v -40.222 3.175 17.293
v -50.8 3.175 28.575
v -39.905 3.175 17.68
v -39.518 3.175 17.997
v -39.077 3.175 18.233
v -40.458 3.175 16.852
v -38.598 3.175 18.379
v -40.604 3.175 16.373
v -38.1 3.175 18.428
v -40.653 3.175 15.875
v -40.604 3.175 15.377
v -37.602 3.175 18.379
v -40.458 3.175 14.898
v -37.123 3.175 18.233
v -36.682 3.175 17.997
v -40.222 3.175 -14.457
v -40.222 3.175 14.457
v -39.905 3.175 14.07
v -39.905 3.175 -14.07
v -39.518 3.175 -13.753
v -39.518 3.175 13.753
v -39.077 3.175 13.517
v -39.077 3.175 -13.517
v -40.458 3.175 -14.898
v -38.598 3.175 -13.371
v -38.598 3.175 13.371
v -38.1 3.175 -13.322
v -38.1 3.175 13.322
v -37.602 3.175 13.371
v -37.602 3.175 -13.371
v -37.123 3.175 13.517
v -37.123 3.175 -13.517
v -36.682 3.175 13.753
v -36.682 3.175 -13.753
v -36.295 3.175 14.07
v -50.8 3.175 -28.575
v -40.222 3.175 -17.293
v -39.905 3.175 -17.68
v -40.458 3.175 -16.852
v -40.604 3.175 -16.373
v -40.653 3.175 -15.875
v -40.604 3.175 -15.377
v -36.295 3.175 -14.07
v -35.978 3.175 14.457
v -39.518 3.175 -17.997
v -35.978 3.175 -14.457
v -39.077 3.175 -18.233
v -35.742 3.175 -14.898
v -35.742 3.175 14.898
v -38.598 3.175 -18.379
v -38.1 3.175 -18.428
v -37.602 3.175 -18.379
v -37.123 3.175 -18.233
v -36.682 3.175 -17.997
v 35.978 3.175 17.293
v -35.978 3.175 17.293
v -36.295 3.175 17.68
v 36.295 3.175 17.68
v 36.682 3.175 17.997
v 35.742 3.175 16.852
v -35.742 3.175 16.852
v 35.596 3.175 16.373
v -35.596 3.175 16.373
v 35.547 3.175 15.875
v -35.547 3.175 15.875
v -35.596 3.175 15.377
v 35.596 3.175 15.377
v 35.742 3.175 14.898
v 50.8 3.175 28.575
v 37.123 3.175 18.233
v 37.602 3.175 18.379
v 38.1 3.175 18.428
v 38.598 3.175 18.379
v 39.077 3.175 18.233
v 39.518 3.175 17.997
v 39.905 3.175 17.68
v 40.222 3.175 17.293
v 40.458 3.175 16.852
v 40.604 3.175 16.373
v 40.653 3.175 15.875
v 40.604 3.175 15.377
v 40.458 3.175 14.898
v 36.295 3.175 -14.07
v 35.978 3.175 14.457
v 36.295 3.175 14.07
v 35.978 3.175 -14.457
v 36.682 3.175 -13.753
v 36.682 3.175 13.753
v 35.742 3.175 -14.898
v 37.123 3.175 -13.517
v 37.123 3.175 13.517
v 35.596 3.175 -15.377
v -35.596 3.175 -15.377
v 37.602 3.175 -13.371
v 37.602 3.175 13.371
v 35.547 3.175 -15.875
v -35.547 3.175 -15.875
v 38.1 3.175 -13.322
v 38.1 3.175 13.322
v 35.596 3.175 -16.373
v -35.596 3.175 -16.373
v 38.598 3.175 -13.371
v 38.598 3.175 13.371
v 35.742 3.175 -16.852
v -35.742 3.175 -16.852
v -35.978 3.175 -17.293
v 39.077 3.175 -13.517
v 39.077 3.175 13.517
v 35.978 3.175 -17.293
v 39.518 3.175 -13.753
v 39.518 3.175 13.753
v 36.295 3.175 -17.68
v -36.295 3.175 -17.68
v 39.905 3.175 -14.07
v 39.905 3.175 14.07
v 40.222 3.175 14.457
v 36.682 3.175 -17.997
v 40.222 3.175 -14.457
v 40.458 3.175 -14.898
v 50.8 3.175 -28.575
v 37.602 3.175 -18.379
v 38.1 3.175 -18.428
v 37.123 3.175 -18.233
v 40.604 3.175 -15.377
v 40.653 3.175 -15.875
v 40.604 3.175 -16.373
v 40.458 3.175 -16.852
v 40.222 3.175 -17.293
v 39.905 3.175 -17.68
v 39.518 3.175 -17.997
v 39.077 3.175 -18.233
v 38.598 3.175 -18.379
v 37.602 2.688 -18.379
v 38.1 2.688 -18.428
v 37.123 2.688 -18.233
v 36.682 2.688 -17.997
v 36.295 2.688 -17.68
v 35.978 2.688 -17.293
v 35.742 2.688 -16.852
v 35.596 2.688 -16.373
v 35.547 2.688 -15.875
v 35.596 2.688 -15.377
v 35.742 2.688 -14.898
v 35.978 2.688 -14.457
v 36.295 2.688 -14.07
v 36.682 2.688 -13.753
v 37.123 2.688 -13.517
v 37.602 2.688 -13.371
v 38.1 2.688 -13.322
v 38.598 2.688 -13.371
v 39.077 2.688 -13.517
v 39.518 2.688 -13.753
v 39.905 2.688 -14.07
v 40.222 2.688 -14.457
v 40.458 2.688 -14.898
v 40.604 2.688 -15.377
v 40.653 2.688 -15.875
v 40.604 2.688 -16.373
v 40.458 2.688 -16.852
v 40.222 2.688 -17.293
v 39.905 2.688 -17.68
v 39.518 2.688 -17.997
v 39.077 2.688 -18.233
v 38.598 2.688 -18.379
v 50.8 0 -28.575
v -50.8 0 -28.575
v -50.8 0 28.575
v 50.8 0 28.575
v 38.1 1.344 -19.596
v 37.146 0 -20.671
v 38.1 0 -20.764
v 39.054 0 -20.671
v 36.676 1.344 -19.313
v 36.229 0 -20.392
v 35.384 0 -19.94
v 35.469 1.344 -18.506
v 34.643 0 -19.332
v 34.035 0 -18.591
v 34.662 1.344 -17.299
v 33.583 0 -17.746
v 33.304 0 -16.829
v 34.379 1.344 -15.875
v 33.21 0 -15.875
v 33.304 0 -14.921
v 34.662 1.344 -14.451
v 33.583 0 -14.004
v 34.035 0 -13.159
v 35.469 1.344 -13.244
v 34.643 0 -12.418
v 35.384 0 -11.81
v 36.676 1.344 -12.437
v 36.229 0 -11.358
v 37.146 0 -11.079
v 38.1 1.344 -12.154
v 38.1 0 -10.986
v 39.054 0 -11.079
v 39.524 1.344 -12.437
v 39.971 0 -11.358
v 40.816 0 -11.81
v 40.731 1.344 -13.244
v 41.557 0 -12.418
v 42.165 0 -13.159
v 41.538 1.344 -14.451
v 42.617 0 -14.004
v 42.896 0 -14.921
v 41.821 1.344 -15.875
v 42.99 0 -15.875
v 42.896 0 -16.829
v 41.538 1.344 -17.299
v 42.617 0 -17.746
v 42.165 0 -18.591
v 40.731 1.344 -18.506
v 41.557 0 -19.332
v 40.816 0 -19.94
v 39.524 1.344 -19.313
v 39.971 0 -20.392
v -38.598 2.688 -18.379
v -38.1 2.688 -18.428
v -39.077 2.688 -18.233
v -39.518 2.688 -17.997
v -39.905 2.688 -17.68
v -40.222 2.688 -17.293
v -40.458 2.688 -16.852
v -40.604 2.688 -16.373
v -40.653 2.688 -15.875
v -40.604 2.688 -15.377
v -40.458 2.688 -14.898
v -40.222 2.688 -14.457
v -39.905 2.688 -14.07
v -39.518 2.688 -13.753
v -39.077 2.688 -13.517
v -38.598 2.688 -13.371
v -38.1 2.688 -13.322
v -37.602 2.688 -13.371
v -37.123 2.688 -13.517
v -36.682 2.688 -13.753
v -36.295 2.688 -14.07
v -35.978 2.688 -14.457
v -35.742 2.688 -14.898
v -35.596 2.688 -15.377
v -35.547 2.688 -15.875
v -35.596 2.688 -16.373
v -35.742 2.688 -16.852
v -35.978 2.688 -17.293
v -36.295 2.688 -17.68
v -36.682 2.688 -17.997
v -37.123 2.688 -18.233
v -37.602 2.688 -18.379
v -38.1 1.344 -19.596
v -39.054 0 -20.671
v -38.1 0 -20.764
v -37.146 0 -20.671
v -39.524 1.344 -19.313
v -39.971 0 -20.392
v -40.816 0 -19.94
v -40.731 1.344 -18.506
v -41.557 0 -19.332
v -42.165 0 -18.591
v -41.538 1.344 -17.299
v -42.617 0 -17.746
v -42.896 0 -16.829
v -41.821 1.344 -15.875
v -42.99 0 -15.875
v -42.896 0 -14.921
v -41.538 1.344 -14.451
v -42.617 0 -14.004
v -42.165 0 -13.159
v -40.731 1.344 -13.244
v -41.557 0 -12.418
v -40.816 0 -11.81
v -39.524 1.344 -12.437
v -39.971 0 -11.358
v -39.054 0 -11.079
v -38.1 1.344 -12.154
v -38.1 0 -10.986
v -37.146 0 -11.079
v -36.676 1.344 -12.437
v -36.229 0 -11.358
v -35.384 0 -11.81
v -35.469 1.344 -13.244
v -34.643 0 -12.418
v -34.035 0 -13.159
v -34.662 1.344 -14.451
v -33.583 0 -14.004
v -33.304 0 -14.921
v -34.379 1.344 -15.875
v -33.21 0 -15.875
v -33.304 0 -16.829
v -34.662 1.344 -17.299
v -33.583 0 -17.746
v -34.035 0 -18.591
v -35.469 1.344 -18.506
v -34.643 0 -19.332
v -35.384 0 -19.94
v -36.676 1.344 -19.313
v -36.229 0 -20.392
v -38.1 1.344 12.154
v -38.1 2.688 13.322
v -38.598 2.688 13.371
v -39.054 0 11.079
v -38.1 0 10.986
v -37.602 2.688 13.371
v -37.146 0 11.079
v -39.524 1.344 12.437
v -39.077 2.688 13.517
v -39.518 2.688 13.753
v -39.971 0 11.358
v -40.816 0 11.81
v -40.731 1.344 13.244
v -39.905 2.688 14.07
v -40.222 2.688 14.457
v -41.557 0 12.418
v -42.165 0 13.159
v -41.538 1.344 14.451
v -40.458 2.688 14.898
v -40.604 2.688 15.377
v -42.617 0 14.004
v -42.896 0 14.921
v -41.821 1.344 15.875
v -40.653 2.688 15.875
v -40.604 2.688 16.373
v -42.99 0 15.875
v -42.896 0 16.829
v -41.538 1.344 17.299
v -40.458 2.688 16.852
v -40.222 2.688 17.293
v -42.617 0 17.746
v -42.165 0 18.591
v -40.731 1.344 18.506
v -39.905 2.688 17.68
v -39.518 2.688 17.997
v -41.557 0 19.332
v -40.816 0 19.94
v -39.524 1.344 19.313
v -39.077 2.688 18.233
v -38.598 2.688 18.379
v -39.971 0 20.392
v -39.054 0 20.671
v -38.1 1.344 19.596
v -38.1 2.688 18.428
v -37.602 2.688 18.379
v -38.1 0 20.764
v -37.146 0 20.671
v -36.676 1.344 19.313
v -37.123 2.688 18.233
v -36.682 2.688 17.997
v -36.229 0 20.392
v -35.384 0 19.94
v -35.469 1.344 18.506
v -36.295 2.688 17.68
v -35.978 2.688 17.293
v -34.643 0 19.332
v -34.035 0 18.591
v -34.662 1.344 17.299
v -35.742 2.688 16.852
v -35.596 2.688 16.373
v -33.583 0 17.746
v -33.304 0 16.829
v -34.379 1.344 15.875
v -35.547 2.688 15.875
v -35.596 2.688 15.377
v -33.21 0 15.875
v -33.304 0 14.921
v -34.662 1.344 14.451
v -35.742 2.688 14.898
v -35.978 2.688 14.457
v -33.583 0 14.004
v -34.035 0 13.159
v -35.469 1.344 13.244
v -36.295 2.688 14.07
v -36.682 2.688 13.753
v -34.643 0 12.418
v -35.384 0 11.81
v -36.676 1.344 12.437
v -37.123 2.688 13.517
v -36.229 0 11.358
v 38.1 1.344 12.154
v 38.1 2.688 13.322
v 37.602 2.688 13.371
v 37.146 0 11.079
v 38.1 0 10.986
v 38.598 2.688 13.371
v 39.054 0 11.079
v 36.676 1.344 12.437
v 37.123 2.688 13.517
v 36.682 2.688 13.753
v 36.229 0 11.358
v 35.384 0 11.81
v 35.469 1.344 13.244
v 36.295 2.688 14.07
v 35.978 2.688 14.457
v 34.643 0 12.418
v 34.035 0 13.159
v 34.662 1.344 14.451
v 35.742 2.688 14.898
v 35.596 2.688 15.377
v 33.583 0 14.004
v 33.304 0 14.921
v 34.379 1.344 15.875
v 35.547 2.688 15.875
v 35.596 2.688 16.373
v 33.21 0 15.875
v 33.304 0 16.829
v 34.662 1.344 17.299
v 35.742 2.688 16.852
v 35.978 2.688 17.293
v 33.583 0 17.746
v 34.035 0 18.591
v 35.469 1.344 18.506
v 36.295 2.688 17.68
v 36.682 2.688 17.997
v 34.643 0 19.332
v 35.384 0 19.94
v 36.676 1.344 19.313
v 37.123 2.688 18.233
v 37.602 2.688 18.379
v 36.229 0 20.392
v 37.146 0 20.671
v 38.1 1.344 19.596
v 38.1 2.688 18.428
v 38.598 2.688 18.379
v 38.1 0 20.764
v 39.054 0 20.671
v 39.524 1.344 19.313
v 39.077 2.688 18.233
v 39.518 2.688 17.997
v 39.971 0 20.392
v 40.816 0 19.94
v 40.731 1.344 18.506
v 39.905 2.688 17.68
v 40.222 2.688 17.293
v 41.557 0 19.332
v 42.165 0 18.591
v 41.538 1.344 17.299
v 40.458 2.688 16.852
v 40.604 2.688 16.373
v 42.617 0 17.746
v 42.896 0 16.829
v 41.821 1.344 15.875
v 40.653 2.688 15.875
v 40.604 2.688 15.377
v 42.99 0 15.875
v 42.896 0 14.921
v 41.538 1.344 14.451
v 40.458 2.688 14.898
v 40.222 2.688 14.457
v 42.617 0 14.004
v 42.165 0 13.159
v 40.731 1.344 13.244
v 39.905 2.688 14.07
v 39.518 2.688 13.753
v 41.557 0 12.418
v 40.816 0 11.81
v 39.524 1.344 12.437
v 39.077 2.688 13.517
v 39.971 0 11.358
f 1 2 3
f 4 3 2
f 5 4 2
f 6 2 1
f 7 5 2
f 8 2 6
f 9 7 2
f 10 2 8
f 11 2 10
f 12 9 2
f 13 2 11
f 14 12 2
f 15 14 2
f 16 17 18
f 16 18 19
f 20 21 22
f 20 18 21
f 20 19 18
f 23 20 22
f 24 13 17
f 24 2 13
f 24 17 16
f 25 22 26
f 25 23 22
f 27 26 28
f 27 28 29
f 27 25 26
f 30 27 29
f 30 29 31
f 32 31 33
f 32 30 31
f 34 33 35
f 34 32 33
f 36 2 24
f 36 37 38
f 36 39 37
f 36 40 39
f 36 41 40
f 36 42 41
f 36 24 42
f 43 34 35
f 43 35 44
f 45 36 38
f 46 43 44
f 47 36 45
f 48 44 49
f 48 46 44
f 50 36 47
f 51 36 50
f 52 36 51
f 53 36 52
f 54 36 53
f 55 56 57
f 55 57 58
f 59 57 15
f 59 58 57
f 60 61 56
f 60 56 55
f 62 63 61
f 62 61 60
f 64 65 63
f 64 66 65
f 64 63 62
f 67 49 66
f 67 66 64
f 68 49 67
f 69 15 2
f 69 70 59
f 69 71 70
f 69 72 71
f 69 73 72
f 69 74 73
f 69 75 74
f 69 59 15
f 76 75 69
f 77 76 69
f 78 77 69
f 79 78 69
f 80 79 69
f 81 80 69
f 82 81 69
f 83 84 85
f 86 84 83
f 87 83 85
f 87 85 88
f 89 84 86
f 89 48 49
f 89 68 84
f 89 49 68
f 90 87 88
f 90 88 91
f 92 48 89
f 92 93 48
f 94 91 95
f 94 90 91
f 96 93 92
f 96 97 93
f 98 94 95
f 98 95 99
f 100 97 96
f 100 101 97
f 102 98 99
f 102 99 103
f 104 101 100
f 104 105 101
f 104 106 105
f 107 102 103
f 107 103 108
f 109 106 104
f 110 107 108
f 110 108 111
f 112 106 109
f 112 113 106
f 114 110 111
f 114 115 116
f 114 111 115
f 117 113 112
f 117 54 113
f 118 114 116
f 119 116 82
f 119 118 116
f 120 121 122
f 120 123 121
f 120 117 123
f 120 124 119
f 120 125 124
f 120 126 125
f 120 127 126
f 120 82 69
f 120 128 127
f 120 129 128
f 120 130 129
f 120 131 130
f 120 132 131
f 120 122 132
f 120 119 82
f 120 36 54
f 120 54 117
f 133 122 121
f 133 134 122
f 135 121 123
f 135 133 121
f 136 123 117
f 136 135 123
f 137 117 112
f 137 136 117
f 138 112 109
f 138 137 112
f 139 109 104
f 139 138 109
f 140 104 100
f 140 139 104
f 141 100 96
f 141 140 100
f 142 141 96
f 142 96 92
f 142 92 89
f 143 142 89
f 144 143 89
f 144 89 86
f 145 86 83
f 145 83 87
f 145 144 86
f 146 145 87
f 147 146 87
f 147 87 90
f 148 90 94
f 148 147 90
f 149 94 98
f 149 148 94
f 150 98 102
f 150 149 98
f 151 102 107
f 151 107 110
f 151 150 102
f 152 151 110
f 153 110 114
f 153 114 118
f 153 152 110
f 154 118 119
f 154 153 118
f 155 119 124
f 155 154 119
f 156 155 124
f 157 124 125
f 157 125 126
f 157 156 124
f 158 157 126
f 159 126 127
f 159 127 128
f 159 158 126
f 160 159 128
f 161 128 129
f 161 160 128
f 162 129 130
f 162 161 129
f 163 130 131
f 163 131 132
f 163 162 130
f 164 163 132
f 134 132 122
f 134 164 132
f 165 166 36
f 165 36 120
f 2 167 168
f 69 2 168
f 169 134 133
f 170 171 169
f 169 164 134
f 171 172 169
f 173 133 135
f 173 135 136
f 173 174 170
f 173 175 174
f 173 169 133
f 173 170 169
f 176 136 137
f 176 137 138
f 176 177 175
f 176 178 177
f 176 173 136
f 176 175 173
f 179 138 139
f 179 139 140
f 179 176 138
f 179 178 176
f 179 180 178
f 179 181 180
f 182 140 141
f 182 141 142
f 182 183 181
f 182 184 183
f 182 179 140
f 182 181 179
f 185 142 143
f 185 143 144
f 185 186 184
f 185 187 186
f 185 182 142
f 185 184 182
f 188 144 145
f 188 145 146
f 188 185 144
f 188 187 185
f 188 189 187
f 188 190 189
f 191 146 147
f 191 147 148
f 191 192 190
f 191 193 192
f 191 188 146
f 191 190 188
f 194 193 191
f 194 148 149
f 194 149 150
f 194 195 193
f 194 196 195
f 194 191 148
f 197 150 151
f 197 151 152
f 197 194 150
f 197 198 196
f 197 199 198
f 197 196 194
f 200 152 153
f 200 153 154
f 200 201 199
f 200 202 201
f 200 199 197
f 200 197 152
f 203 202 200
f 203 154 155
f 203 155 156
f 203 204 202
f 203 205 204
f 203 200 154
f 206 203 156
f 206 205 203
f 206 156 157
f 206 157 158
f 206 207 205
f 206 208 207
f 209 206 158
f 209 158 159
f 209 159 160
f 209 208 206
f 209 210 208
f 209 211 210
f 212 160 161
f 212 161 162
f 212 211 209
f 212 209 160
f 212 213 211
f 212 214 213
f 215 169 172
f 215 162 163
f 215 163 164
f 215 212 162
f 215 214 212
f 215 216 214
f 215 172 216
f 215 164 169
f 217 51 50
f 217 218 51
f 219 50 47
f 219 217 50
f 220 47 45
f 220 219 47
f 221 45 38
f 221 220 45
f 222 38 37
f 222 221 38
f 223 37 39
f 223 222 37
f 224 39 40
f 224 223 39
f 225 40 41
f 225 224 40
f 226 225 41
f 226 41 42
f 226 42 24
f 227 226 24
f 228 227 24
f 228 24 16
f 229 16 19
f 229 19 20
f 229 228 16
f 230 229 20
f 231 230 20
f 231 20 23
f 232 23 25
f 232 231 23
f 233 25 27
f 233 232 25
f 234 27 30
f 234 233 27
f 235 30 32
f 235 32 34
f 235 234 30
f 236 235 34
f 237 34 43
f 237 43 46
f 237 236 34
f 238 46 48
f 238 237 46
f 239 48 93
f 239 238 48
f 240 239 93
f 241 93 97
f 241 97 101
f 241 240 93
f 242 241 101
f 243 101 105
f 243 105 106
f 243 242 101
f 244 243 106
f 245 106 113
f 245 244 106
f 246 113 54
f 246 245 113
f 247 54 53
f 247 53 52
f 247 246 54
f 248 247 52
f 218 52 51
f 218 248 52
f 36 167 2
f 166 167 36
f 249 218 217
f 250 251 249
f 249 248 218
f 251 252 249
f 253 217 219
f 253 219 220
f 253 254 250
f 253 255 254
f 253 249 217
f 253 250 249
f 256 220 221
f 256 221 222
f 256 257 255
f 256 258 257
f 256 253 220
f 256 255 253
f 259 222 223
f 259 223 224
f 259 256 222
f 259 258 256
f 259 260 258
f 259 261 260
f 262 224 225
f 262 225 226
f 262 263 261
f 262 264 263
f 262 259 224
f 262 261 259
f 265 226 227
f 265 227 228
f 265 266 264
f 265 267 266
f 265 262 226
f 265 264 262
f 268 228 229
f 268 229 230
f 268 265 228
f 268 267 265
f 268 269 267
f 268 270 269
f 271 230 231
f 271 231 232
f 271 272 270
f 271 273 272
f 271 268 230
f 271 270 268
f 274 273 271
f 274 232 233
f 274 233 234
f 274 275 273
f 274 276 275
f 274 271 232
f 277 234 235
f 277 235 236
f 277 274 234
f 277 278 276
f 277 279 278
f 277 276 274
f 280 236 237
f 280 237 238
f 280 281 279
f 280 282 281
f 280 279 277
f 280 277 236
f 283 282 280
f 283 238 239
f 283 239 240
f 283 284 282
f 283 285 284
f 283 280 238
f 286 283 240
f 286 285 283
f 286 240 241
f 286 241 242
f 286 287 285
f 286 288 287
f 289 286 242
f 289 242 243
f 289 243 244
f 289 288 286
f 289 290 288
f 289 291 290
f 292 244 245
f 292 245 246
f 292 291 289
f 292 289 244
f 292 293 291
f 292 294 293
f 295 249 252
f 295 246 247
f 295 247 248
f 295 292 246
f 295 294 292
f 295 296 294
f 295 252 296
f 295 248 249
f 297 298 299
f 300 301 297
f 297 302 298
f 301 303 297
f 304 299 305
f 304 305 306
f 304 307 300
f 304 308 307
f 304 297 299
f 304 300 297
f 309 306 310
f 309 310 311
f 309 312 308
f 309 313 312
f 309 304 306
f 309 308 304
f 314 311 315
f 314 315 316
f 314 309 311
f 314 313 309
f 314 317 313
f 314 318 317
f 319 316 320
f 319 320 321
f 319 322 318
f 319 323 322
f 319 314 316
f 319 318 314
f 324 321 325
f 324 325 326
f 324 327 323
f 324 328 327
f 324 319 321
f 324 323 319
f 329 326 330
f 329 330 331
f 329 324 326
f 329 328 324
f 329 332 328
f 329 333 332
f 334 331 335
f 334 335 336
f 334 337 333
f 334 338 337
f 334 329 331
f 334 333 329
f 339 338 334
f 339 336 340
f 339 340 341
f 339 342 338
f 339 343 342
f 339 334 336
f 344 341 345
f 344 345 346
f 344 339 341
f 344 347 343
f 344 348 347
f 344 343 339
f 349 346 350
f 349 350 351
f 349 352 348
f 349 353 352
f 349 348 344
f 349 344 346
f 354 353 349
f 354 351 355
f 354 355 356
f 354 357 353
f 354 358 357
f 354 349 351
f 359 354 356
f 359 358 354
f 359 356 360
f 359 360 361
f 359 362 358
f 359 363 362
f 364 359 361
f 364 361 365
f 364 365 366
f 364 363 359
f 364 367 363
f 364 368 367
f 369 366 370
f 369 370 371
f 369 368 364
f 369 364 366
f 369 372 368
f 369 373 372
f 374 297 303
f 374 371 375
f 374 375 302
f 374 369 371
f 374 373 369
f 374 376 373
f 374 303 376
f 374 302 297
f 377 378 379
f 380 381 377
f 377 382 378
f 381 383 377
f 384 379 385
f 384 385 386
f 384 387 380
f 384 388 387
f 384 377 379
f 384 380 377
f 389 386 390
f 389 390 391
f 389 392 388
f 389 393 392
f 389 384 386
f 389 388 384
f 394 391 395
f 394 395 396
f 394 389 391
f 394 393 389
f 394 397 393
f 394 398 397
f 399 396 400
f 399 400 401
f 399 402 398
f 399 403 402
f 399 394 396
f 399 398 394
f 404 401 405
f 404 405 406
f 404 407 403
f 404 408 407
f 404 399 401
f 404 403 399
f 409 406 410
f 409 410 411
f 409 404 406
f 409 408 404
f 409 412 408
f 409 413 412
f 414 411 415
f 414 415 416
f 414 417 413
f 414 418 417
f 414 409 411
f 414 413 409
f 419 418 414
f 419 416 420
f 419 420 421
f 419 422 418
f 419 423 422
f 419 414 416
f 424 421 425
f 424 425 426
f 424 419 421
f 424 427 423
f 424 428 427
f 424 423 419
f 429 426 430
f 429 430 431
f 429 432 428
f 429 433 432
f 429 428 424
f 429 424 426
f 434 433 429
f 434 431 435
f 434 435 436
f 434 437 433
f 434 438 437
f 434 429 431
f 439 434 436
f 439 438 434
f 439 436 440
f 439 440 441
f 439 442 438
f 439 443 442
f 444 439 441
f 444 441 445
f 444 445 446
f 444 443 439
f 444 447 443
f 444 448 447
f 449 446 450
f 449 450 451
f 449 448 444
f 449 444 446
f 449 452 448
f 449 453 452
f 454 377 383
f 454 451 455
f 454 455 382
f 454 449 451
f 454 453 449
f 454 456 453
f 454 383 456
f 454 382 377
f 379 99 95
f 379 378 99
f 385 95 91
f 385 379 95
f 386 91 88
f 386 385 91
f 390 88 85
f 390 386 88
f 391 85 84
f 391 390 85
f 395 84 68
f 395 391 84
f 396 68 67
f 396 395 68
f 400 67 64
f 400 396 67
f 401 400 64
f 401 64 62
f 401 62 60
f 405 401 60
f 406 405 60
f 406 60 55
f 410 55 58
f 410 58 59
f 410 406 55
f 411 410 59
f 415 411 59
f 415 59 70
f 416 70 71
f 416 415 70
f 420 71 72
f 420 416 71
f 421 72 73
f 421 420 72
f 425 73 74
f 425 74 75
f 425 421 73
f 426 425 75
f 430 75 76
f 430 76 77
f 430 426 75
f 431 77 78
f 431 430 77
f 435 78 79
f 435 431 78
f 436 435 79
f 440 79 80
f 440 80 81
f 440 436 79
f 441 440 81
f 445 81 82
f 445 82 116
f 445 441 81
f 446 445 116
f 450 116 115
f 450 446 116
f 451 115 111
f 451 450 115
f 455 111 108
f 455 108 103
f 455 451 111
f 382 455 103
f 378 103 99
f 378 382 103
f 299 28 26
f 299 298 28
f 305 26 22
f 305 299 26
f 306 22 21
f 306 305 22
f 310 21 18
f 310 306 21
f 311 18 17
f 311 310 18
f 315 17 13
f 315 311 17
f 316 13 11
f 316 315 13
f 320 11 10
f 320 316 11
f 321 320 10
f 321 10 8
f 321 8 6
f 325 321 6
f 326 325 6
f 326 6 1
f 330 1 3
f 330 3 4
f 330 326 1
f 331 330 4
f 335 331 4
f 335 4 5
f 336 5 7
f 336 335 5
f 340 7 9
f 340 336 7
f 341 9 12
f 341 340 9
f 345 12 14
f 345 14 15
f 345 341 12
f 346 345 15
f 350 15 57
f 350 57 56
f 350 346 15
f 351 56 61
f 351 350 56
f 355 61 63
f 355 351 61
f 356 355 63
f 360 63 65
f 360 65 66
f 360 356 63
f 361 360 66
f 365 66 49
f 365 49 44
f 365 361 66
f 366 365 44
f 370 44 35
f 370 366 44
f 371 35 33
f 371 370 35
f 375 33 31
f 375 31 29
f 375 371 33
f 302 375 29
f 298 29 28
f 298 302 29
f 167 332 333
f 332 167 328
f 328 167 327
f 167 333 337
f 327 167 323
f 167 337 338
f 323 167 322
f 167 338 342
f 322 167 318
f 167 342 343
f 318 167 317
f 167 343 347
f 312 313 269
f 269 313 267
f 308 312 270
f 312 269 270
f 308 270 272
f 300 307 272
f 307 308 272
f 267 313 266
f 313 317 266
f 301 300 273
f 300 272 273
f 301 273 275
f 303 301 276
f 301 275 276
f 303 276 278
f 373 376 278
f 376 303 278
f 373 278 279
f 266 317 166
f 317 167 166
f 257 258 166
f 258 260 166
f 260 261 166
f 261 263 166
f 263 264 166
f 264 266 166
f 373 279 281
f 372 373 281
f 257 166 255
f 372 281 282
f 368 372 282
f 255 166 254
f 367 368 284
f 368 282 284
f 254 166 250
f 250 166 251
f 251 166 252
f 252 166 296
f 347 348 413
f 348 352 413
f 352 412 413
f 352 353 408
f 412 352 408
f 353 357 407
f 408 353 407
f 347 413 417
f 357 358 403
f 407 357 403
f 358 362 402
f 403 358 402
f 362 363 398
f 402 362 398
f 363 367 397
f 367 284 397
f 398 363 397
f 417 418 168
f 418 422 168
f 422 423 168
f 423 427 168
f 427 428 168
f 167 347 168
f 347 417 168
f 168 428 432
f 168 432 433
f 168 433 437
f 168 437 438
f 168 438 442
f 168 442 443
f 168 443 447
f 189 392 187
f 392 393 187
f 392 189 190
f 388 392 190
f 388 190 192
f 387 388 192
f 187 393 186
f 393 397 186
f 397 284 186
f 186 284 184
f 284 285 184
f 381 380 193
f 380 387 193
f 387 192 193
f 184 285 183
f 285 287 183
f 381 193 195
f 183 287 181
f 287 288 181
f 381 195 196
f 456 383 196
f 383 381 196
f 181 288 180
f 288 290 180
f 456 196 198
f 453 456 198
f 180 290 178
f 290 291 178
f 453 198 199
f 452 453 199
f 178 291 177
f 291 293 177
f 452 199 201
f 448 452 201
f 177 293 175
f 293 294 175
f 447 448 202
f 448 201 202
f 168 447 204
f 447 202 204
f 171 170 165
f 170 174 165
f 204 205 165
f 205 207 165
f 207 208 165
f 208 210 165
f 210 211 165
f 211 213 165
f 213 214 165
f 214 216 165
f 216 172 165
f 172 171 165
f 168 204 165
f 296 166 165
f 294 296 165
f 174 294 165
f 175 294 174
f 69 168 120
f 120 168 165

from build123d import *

# Parameters (mm, degrees)
SKETCH1_W                                    = 101.6
SKETCH1_H                                    = 57.15
BOSS_EXTRUDE1_DEPTH                          = 3.175
CSK_FOR_10_FLAT_HEAD_MACHINE_SCREW1_AT_COUNT = 2
CSK_FOR_10_FLAT_HEAD_MACHINE_SCREW1_AT_PITCH = 31.75
CSK_FOR_10_FLAT_HEAD_MACHINE_SCREW1_2_COUNT  = 2
CSK_FOR_10_FLAT_HEAD_MACHINE_SCREW1_2_PITCH  = 76.2
CSK_FOR_10_FLAT_HEAD_MACHINE_SCREW1_3_COUNT  = 2
CSK_FOR_10_FLAT_HEAD_MACHINE_SCREW1_3_PITCH  = 82.55


with BuildPart() as part:
    # Sketch1 → Boss-Extrude1 (new body)
    with BuildSketch(Plane(origin=(0, 0, 0), x_dir=(1, 0, 0), z_dir=(0, 1, 0))):
        Rectangle(SKETCH1_W, SKETCH1_H)
    extrude(amount=BOSS_EXTRUDE1_DEPTH)

    # Sketch10 → CSK for #10 Flat Head Machine Screw1 (revolve, cut)
    with BuildSketch(Plane(origin=(-38.1, 0, 15.875), x_dir=(0, 0, -1), z_dir=(1, 0, 0))):
        Polygon((0, 0), (0, 3.175), (2.5527, 3.175), (2.5527, 2.688180894), (4.8895, 0), align=None)
    csk_for_10_flat_head_machine_screw1 = revolve(axis=Axis((-38.1, -6.35, 15.875), (0, 1, 0)), mode=Mode.SUBTRACT)

    # CSK for #10 Flat Head Machine Screw1 at: CSK for #10 Flat Head Machine Screw1 ×2
    with Locations(*[(0, 0, -i * CSK_FOR_10_FLAT_HEAD_MACHINE_SCREW1_AT_PITCH) for i in range(1, CSK_FOR_10_FLAT_HEAD_MACHINE_SCREW1_AT_COUNT)]):
        add(csk_for_10_flat_head_machine_screw1, mode=Mode.SUBTRACT)

    # CSK for _10 Flat Head Machine Screw1 2: CSK for #10 Flat Head Machine Screw1 ×2
    with Locations(*[(i * CSK_FOR_10_FLAT_HEAD_MACHINE_SCREW1_2_PITCH, 0, 0) for i in range(1, CSK_FOR_10_FLAT_HEAD_MACHINE_SCREW1_2_COUNT)]):
        add(csk_for_10_flat_head_machine_screw1, mode=Mode.SUBTRACT)

    # CSK for _10 Flat Head Machine Screw1 3: CSK for #10 Flat Head Machine Screw1 ×2
    with Locations(*[Vector(0.9230769230769231, 0, -0.38461538461538464) * (i * CSK_FOR_10_FLAT_HEAD_MACHINE_SCREW1_3_PITCH) for i in range(1, CSK_FOR_10_FLAT_HEAD_MACHINE_SCREW1_3_COUNT)]):
        add(csk_for_10_flat_head_machine_screw1, mode=Mode.SUBTRACT)


solid = part.part
